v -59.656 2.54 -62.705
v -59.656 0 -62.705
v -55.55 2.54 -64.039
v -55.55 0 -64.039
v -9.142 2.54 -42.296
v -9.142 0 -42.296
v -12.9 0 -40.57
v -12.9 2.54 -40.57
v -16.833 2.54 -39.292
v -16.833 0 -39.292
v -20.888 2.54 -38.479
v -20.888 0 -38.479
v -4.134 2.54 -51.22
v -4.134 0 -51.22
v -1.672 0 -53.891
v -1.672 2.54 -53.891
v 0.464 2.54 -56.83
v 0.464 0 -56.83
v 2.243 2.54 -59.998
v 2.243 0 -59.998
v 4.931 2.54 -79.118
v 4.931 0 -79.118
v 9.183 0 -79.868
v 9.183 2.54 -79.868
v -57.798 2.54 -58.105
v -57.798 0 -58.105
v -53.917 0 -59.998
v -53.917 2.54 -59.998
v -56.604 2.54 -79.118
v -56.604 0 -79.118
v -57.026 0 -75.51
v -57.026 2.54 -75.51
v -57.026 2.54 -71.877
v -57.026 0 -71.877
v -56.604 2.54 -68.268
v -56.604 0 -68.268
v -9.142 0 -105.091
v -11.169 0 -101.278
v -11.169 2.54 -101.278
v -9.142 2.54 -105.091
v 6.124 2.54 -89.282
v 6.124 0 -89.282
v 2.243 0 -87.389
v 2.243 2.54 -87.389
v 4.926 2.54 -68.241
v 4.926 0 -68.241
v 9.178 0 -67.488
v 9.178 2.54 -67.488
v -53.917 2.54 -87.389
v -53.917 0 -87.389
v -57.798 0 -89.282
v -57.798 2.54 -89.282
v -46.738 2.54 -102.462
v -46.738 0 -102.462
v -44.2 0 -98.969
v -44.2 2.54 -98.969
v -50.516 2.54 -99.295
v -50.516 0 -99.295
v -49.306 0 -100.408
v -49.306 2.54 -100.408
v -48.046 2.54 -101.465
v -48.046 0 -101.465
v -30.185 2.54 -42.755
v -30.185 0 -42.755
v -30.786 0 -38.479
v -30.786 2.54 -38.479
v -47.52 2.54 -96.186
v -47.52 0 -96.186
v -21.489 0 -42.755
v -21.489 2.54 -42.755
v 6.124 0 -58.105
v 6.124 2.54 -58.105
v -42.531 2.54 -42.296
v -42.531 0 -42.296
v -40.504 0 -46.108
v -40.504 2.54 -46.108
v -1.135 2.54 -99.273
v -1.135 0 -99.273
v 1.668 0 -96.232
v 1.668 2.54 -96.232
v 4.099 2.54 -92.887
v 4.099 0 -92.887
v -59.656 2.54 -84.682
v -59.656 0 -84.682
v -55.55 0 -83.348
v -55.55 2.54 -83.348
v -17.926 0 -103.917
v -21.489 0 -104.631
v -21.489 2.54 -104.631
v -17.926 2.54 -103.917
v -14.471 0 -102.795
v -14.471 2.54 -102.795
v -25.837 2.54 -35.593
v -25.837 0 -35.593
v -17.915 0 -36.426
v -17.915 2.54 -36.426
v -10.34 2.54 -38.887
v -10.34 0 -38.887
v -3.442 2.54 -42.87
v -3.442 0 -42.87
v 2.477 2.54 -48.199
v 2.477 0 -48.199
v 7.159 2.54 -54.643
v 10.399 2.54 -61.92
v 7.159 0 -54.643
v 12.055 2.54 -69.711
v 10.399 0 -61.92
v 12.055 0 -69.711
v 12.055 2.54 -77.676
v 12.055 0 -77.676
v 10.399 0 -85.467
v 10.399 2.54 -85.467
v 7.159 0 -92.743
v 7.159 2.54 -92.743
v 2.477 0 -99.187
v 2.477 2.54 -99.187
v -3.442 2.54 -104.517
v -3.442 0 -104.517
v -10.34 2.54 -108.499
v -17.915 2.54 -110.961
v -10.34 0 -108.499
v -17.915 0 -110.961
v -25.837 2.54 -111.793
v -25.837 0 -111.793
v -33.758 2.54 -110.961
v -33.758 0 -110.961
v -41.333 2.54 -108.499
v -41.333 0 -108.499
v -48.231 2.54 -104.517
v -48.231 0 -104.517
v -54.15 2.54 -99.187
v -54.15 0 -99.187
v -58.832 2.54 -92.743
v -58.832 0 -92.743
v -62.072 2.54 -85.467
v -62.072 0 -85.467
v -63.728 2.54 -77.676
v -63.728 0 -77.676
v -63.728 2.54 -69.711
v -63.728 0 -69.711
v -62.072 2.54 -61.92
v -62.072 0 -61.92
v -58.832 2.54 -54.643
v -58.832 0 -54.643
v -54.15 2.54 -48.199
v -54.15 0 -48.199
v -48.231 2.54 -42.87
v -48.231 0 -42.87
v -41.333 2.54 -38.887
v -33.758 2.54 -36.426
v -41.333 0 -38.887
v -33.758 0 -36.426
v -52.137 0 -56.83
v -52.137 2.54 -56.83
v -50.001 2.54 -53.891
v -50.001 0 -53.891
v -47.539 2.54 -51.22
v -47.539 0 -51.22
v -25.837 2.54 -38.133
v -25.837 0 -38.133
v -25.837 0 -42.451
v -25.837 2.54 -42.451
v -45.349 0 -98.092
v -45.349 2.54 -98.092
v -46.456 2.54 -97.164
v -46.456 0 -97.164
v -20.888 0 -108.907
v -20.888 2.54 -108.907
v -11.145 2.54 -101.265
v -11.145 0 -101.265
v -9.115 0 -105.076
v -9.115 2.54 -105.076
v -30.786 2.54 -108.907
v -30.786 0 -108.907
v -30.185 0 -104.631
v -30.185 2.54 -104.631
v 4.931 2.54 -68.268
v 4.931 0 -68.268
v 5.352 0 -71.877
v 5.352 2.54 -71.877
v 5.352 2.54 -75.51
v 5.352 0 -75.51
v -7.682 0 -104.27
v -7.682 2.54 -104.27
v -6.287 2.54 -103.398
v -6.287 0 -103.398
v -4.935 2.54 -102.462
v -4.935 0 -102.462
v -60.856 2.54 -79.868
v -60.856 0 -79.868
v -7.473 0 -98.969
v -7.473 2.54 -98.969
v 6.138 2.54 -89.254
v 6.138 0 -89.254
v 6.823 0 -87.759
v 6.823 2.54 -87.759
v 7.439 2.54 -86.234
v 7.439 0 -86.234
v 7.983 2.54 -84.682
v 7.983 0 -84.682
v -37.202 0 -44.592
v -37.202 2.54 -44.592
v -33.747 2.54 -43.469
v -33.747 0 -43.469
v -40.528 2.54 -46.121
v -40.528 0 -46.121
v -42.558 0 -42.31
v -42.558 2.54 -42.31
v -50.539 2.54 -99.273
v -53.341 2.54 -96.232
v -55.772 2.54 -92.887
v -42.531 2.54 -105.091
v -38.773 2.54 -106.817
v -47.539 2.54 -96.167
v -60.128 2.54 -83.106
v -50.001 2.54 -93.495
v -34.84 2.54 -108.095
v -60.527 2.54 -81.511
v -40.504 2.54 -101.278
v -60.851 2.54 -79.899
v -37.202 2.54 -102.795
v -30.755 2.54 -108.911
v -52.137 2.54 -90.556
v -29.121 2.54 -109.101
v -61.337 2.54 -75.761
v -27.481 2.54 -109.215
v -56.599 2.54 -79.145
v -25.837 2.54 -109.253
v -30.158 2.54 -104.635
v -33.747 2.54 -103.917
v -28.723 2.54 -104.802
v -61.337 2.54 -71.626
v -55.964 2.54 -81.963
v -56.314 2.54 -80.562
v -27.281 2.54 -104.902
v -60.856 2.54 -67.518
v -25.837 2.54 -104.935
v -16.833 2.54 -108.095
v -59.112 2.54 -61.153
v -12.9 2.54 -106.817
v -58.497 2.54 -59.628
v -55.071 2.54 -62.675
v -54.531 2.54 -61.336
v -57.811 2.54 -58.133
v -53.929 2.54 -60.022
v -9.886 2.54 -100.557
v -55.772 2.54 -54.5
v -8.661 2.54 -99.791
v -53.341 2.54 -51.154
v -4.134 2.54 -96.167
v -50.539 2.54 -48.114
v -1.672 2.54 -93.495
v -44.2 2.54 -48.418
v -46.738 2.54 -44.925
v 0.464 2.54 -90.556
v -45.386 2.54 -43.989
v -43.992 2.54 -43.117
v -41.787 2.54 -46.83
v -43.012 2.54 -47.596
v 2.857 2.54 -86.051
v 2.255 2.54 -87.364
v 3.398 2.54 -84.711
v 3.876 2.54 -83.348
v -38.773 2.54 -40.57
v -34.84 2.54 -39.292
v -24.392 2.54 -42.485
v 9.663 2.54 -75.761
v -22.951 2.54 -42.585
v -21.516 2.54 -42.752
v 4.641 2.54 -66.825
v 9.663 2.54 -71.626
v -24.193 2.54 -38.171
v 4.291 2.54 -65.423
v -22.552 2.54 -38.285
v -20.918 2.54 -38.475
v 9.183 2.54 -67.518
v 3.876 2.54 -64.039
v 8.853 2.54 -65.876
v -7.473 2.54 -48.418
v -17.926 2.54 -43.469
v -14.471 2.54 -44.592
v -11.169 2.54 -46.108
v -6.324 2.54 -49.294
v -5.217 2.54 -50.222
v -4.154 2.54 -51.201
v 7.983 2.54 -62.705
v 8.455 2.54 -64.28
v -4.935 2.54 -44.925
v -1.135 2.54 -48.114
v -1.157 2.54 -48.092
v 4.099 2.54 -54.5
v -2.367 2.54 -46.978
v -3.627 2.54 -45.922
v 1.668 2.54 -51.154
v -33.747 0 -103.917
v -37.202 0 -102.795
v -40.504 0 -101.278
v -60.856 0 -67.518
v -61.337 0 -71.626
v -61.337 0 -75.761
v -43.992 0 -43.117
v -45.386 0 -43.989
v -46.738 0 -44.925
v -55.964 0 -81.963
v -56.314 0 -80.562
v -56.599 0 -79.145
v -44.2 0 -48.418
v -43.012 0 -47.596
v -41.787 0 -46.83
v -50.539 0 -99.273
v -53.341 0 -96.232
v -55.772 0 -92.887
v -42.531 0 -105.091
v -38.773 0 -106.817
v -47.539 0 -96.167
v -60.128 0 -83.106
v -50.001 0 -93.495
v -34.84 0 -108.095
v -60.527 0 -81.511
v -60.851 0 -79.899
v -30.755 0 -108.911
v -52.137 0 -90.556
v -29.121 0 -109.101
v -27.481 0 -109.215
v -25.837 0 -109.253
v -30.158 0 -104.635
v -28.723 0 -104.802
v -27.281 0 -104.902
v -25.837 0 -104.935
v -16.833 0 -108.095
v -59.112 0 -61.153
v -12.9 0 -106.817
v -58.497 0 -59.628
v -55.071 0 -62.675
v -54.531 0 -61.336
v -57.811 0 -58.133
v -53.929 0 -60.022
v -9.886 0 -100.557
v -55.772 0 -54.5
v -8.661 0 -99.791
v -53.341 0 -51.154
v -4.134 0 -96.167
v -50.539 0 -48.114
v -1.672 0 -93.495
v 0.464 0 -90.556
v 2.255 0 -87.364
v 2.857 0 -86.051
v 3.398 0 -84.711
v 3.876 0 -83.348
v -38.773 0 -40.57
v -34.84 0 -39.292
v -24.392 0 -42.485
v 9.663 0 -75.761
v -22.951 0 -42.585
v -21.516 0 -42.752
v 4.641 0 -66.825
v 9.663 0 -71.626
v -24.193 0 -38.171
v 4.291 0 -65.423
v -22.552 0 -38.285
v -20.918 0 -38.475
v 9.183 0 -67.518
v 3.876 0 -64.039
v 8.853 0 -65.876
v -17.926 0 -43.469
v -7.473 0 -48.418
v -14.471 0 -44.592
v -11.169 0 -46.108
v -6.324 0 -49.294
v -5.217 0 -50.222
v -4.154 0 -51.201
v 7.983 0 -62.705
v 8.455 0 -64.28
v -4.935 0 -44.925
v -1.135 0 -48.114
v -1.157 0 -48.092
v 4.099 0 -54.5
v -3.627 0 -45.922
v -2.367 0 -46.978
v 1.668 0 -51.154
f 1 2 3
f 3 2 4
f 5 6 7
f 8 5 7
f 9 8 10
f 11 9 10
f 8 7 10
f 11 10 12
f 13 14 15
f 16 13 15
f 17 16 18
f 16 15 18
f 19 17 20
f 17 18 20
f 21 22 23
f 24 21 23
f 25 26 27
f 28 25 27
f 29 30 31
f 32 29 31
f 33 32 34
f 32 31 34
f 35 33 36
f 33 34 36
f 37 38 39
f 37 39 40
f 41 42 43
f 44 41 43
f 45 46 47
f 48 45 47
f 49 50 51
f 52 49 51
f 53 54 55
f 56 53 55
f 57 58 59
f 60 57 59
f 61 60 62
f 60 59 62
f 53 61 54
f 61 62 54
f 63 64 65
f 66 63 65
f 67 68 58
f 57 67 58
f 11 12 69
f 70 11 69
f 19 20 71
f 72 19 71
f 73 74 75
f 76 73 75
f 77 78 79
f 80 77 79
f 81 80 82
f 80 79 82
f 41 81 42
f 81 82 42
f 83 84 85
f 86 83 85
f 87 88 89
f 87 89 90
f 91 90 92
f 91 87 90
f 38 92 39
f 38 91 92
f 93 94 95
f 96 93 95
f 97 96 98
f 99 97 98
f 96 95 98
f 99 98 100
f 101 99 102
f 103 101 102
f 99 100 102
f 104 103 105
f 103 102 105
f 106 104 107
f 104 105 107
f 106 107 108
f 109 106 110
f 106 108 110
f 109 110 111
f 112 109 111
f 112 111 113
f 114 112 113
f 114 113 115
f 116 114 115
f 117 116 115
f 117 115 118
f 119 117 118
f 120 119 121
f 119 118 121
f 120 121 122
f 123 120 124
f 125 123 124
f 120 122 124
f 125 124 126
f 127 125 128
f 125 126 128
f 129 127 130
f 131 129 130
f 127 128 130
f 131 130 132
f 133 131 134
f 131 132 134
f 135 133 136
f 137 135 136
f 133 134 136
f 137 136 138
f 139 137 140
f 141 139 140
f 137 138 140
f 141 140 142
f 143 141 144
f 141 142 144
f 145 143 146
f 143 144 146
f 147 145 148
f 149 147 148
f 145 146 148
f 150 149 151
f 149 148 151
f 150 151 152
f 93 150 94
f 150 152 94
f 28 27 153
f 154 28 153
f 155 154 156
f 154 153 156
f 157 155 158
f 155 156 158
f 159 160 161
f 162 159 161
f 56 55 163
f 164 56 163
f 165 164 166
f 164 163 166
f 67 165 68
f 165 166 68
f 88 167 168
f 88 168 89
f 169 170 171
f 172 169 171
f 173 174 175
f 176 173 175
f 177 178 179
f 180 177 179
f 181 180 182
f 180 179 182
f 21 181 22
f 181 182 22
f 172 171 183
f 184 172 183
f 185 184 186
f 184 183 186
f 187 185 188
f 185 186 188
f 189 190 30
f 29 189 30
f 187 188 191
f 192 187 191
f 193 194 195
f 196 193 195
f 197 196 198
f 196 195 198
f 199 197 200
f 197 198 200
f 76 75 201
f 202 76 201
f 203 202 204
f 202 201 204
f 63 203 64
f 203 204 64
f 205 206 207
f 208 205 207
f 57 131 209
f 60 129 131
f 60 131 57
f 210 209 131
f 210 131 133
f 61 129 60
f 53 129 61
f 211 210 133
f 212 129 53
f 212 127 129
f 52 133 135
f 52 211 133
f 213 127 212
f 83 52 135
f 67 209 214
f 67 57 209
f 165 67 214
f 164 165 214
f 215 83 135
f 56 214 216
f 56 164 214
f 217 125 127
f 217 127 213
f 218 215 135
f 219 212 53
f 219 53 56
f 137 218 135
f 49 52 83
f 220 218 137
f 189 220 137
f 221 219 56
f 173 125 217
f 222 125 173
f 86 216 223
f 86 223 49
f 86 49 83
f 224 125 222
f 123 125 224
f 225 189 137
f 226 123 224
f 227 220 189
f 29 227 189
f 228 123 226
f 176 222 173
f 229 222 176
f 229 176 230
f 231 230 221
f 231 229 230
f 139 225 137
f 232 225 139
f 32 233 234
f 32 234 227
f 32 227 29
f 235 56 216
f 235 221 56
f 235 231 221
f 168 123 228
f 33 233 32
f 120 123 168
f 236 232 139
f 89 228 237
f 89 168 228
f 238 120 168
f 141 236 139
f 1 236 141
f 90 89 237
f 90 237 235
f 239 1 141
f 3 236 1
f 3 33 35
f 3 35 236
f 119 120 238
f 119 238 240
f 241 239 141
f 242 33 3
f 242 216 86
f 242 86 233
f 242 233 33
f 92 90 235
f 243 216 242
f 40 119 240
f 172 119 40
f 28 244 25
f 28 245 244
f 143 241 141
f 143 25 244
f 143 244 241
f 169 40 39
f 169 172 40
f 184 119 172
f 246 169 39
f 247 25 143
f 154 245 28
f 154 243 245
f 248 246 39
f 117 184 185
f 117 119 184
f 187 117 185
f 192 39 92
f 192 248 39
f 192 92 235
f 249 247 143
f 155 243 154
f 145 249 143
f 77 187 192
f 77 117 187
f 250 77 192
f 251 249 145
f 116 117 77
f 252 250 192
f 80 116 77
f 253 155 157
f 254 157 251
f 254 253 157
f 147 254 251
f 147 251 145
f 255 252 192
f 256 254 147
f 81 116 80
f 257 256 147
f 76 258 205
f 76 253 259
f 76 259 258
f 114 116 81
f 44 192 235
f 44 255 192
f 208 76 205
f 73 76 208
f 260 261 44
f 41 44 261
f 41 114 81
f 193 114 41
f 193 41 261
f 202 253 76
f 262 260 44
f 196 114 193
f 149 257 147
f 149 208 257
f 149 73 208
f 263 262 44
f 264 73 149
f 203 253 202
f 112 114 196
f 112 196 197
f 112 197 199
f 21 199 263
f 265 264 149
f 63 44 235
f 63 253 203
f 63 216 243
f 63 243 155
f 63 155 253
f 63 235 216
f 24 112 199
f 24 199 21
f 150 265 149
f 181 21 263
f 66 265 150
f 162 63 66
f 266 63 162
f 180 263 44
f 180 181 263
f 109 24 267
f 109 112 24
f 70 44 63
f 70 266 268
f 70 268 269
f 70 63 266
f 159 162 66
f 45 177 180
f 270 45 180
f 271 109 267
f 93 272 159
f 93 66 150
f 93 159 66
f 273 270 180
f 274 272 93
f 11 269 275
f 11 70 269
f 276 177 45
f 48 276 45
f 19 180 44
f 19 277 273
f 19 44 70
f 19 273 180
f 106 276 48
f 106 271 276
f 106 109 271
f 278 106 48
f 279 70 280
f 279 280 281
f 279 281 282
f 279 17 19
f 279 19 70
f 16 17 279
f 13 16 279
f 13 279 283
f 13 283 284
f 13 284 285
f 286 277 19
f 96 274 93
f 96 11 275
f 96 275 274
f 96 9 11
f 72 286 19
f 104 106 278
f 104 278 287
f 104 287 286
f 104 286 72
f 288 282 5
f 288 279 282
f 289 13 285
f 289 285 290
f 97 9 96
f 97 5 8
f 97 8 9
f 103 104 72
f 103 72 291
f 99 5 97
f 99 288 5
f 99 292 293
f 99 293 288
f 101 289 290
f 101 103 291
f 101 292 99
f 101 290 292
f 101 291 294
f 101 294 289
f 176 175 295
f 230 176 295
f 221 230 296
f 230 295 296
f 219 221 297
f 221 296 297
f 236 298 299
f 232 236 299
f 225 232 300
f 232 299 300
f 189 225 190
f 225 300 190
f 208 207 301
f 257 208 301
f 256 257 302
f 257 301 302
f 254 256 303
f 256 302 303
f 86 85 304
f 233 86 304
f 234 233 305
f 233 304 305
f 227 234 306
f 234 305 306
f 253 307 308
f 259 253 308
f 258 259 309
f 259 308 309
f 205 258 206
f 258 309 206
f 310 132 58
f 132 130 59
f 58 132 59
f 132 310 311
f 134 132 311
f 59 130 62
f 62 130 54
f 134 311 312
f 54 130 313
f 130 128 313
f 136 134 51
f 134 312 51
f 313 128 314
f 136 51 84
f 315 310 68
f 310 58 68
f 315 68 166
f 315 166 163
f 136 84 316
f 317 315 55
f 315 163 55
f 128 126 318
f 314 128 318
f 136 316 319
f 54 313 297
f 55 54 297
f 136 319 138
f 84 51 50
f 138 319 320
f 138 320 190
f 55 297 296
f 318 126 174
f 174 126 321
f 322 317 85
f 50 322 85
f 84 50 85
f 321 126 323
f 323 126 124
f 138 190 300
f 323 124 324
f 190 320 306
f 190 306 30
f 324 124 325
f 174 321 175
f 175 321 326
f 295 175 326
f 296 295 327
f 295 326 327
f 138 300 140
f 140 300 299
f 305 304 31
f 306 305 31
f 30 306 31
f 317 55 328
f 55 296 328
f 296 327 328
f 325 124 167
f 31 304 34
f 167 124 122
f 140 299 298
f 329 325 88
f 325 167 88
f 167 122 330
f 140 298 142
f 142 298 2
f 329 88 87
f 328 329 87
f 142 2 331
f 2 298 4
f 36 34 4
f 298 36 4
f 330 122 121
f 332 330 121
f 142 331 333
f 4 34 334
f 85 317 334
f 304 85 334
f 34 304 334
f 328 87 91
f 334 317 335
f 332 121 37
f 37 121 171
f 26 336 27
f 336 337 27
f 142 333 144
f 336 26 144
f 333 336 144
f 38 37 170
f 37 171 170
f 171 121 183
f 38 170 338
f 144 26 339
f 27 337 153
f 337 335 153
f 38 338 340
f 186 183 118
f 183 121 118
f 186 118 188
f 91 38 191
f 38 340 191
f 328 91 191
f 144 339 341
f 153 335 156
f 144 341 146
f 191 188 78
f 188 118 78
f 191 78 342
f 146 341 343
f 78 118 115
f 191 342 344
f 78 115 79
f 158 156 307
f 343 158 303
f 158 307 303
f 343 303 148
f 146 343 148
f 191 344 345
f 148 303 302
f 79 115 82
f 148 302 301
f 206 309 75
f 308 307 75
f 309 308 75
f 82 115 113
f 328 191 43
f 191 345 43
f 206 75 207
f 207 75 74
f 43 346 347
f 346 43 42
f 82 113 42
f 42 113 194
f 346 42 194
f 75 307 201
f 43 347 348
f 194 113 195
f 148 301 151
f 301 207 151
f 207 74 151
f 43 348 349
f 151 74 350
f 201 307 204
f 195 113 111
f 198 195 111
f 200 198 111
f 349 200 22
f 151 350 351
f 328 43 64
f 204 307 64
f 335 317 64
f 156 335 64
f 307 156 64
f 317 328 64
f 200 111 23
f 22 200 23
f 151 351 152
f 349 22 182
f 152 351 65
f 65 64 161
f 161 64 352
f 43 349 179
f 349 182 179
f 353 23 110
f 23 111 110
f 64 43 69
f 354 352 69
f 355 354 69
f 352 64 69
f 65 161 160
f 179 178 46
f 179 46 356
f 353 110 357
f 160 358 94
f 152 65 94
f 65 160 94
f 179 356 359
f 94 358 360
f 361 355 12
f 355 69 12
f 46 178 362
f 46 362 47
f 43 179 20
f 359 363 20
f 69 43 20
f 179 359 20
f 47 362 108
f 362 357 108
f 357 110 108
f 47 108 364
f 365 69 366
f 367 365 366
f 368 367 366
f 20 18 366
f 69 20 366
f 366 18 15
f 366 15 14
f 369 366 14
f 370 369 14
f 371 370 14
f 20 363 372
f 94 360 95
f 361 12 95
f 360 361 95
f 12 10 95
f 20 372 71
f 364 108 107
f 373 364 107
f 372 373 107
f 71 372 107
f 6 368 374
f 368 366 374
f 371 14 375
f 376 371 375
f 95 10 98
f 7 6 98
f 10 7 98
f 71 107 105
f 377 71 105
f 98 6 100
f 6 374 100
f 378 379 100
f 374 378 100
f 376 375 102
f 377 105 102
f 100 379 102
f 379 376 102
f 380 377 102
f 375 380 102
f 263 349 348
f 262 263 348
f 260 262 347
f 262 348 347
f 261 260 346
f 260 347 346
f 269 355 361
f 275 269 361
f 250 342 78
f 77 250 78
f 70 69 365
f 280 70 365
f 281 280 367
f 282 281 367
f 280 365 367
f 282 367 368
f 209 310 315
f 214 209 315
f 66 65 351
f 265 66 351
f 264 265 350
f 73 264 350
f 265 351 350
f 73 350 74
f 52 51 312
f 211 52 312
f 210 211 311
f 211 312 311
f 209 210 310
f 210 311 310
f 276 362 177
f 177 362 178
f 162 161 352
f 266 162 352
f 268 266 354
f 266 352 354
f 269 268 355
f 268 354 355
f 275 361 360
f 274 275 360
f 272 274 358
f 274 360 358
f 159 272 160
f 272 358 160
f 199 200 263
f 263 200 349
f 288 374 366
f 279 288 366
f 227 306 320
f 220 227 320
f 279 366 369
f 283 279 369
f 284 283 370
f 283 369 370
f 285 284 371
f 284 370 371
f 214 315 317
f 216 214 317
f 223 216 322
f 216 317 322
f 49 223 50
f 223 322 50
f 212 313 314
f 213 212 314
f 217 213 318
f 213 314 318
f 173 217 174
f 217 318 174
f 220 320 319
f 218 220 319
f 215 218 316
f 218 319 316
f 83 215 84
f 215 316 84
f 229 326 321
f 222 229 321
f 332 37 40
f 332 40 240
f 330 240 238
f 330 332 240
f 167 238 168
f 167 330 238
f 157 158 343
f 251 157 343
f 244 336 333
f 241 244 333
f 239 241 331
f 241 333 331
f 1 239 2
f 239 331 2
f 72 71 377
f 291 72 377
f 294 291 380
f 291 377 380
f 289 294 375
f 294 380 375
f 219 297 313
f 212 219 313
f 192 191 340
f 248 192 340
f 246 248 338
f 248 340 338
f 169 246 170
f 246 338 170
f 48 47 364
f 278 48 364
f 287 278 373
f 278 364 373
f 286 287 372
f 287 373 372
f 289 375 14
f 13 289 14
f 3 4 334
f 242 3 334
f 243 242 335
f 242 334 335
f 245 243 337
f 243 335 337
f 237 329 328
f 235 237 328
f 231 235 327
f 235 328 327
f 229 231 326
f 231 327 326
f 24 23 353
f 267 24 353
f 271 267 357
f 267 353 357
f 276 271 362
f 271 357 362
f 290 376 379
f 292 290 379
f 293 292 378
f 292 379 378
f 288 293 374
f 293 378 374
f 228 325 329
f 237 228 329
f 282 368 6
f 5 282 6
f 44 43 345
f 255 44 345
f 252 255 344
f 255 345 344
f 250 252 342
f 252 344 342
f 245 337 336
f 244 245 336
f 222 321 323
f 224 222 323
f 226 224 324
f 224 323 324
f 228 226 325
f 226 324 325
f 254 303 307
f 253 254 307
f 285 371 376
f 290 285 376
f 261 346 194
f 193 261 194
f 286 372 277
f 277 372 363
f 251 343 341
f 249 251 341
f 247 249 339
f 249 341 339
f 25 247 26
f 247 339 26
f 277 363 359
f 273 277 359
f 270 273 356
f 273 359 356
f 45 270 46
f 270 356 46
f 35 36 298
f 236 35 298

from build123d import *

# Parameters (mm, degrees)
SKETCH1_R           = 38.1
BOSS_EXTRUDE3_DEPTH = 2.54


with BuildPart() as part:
    # Sketch1 → Boss-Extrude3 (new body)
    with BuildSketch(Plane(origin=(0, 0, 0), x_dir=(1, 0, 0), z_dir=(0, 1, 0))):
        with Locations(Location((-25.836673929, 73.693240411, 0), (0, 0, 270))):  # turned: the seam where the file's is
            Circle(SKETCH1_R)
        with BuildLine():
            Line((6.124442357, 89.281718391), (2.243449665, 87.388831779))
            ThreePointArc((2.243449665, 87.388831779), (-0.561364991, 92.056827263), (-4.134157119, 96.166854453))
            Line((-4.134157119, 96.166854453), (-1.134622276, 99.272963711))
            ThreePointArc((-1.134622276, 99.272963711), (2.931970391, 94.594883983), (6.124442357, 89.281718391))
        make_face(mode=Mode.SUBTRACT)
        with BuildLine():
            Line((-4.935030358, 102.461884731), (-7.473087077, 98.968549349))
            ThreePointArc((-7.473087077, 98.968549349), (-9.26937735, 100.180732706), (-11.145376456, 101.265479032))
            Line((-11.145376456, 101.265479032), (-9.114871927, 105.07627624))
            ThreePointArc((-9.114871927, 105.07627624), (-6.979588392, 103.841605625), (-4.935030358, 102.461884731))
        make_face(mode=Mode.SUBTRACT)
        with BuildLine():
            Line((9.183089768, 67.518311213), (4.930689891, 68.268124045))
            ThreePointArc((4.930689891, 68.268124045), (5.405326071, 73.693240411), (4.930689891, 79.118356778))
            Line((4.930689891, 79.118356778), (9.183089768, 79.868169609))
            ThreePointArc((9.183089768, 79.868169609), (9.723326071, 73.693240411), (9.183089768, 67.518311213))
        make_face(mode=Mode.SUBTRACT)
        with BuildLine():
            Line((7.98289579, 84.681884731), (3.876233753, 83.347549349))
            ThreePointArc((3.876233753, 83.347549349), (3.135507895, 85.384059217), (2.25539063, 87.364322037))
            Line((2.25539063, 87.364322037), (6.138033699, 89.253821123))
            ThreePointArc((6.138033699, 89.253821123), (7.139793188, 86.999863442), (7.98289579, 84.681884731))
        make_face(mode=Mode.SUBTRACT)
        with BuildLine():
            Line((-1.134622276, 48.113517111), (-4.134157119, 51.219626369))
            ThreePointArc((-4.134157119, 51.219626369), (-0.561364991, 55.329653559), (2.243449665, 59.997649043))
            Line((2.243449665, 59.997649043), (6.124442357, 58.104762431))
            ThreePointArc((6.124442357, 58.104762431), (2.931970391, 52.79159684), (-1.134622276, 48.113517111))
        make_face(mode=Mode.SUBTRACT)
        with BuildLine():
            Line((7.98289579, 62.704596091), (3.876233753, 64.038931473))
            ThreePointArc((3.876233753, 64.038931473), (4.474004412, 66.1218903), (4.925943869, 68.241276524))
            Line((4.925943869, 68.241276524), (9.177687792, 67.487753059))
            ThreePointArc((9.177687792, 67.487753059), (8.663285158, 65.075443537), (7.98289579, 62.704596091))
        make_face(mode=Mode.SUBTRACT)
        with BuildLine():
            Line((-20.887678459, 38.479307887), (-21.488627909, 42.755285408))
            ThreePointArc((-21.488627909, 42.755285408), (-16.182364991, 43.980332729), (-11.169443364, 46.108191715))
            Line((-11.169443364, 46.108191715), (-9.142265156, 42.295624009))
            ThreePointArc((-9.142265156, 42.295624009), (-14.848029609, 39.873670692), (-20.887678459, 38.479307887))
        make_face(mode=Mode.SUBTRACT)
        with BuildLine():
            Line((-4.935030358, 44.924596091), (-7.473087077, 48.417931473))
            ThreePointArc((-7.473087077, 48.417931473), (-5.765147975, 49.751719785), (-4.153777308, 51.20069591))
            Line((-4.153777308, 51.20069591), (-1.156954198, 48.091970247))
            ThreePointArc((-1.156954198, 48.091970247), (-2.991034632, 46.44272913), (-4.935030358, 44.924596091))
        make_face(mode=Mode.SUBTRACT)
        with BuildLine():
            Line((-42.531082702, 42.295624009), (-40.503904494, 46.108191715))
            ThreePointArc((-40.503904494, 46.108191715), (-35.490982867, 43.980332729), (-30.184719949, 42.755285408))
            Line((-30.184719949, 42.755285408), (-30.785669399, 38.479307887))
            ThreePointArc((-30.785669399, 38.479307887), (-36.825318249, 39.873670692), (-42.531082702, 42.295624009))
        make_face(mode=Mode.SUBTRACT)
        with BuildLine():
            Line((-25.836673929, 38.133240411), (-25.836673929, 42.451240411))
            ThreePointArc((-25.836673929, 42.451240411), (-23.670941071, 42.526396407), (-21.51562802, 42.751502802))
            Line((-21.51562802, 42.751502802), (-20.918410293, 38.475002482))
            ThreePointArc((-20.918410293, 38.475002482), (-23.371612139, 38.218783821), (-25.836673929, 38.133240411))
        make_face(mode=Mode.SUBTRACT)
        with BuildLine():
            Line((-57.797790215, 58.104762431), (-53.916797524, 59.997649043))
            ThreePointArc((-53.916797524, 59.997649043), (-51.111982867, 55.329653559), (-47.539190739, 51.219626369))
            Line((-47.539190739, 51.219626369), (-50.538725583, 48.113517111))
            ThreePointArc((-50.538725583, 48.113517111), (-54.605318249, 52.79159684), (-57.797790215, 58.104762431))
        make_face(mode=Mode.SUBTRACT)
        with BuildLine():
            Line((-46.738317501, 44.924596091), (-44.200260781, 48.417931473))
            ThreePointArc((-44.200260781, 48.417931473), (-42.403970508, 47.205748116), (-40.527971402, 46.12100179))
            Line((-40.527971402, 46.12100179), (-42.558475931, 42.310204583))
            ThreePointArc((-42.558475931, 42.310204583), (-44.693759466, 43.544875197), (-46.738317501, 44.924596091))
        make_face(mode=Mode.SUBTRACT)
        with BuildLine():
            Line((-60.856437626, 79.868169609), (-56.604037749, 79.118356778))
            ThreePointArc((-56.604037749, 79.118356778), (-57.078673929, 73.693240411), (-56.604037749, 68.268124045))
            Line((-56.604037749, 68.268124045), (-60.856437626, 67.518311213))
            ThreePointArc((-60.856437626, 67.518311213), (-61.396673929, 73.693240411), (-60.856437626, 79.868169609))
        make_face(mode=Mode.SUBTRACT)
        with BuildLine():
            Line((-59.656243648, 62.704596091), (-55.549581611, 64.038931473))
            ThreePointArc((-55.549581611, 64.038931473), (-54.808855753, 62.002421606), (-53.928738488, 60.022158786))
            Line((-53.928738488, 60.022158786), (-57.811381557, 58.132659699))
            ThreePointArc((-57.811381557, 58.132659699), (-58.813141046, 60.38661738), (-59.656243648, 62.704596091))
        make_face(mode=Mode.SUBTRACT)
        with BuildLine():
            Line((-50.538725583, 99.272963711), (-47.539190739, 96.166854453))
            ThreePointArc((-47.539190739, 96.166854453), (-51.111982867, 92.056827263), (-53.916797524, 87.388831779))
            Line((-53.916797524, 87.388831779), (-57.797790215, 89.281718391))
            ThreePointArc((-57.797790215, 89.281718391), (-54.605318249, 94.594883983), (-50.538725583, 99.272963711))
        make_face(mode=Mode.SUBTRACT)
        with BuildLine():
            Line((-59.656243648, 84.681884731), (-55.549581611, 83.347549349))
            ThreePointArc((-55.549581611, 83.347549349), (-56.14735227, 81.264590522), (-56.599291727, 79.145204299))
            Line((-56.599291727, 79.145204299), (-60.85103565, 79.898727763))
            ThreePointArc((-60.85103565, 79.898727763), (-60.336633016, 82.311037286), (-59.656243648, 84.681884731))
        make_face(mode=Mode.SUBTRACT)
        with BuildLine():
            Line((-30.785669399, 108.907172936), (-30.184719949, 104.631195415))
            ThreePointArc((-30.184719949, 104.631195415), (-35.490982867, 103.406148093), (-40.503904494, 101.278289107))
            Line((-40.503904494, 101.278289107), (-42.531082702, 105.090856813))
            ThreePointArc((-42.531082702, 105.090856813), (-36.825318249, 107.512810131), (-30.785669399, 108.907172936))
        make_face(mode=Mode.SUBTRACT)
        with BuildLine():
            Line((-46.738317501, 102.461884731), (-44.200260781, 98.968549349))
            ThreePointArc((-44.200260781, 98.968549349), (-45.908199883, 97.634761037), (-47.51957055, 96.185784912))
            Line((-47.51957055, 96.185784912), (-50.51639366, 99.294510575))
            ThreePointArc((-50.51639366, 99.294510575), (-48.682313226, 100.943751693), (-46.738317501, 102.461884731))
        make_face(mode=Mode.SUBTRACT)
        with BuildLine():
            Line((-25.836673929, 109.253240411), (-25.836673929, 104.935240411))
            ThreePointArc((-25.836673929, 104.935240411), (-28.002406787, 104.860084415), (-30.157719838, 104.63497802))
            Line((-30.157719838, 104.63497802), (-30.754937565, 108.91147834))
            ThreePointArc((-30.754937565, 108.91147834), (-28.301735719, 109.167697001), (-25.836673929, 109.253240411))
        make_face(mode=Mode.SUBTRACT)
        with BuildLine():
            Line((-20.887678459, 108.907172936), (-21.488627909, 104.631195415))
            ThreePointArc((-21.488627909, 104.631195415), (-16.182364991, 103.406148093), (-11.169443364, 101.278289107))
            Line((-11.169443364, 101.278289107), (-9.142265156, 105.090856813))
            ThreePointArc((-9.142265156, 105.090856813), (-14.848029609, 107.512810131), (-20.887678459, 108.907172936))
        make_face(mode=Mode.SUBTRACT)
    extrude(amount=BOSS_EXTRUDE3_DEPTH)


solid = part.part
